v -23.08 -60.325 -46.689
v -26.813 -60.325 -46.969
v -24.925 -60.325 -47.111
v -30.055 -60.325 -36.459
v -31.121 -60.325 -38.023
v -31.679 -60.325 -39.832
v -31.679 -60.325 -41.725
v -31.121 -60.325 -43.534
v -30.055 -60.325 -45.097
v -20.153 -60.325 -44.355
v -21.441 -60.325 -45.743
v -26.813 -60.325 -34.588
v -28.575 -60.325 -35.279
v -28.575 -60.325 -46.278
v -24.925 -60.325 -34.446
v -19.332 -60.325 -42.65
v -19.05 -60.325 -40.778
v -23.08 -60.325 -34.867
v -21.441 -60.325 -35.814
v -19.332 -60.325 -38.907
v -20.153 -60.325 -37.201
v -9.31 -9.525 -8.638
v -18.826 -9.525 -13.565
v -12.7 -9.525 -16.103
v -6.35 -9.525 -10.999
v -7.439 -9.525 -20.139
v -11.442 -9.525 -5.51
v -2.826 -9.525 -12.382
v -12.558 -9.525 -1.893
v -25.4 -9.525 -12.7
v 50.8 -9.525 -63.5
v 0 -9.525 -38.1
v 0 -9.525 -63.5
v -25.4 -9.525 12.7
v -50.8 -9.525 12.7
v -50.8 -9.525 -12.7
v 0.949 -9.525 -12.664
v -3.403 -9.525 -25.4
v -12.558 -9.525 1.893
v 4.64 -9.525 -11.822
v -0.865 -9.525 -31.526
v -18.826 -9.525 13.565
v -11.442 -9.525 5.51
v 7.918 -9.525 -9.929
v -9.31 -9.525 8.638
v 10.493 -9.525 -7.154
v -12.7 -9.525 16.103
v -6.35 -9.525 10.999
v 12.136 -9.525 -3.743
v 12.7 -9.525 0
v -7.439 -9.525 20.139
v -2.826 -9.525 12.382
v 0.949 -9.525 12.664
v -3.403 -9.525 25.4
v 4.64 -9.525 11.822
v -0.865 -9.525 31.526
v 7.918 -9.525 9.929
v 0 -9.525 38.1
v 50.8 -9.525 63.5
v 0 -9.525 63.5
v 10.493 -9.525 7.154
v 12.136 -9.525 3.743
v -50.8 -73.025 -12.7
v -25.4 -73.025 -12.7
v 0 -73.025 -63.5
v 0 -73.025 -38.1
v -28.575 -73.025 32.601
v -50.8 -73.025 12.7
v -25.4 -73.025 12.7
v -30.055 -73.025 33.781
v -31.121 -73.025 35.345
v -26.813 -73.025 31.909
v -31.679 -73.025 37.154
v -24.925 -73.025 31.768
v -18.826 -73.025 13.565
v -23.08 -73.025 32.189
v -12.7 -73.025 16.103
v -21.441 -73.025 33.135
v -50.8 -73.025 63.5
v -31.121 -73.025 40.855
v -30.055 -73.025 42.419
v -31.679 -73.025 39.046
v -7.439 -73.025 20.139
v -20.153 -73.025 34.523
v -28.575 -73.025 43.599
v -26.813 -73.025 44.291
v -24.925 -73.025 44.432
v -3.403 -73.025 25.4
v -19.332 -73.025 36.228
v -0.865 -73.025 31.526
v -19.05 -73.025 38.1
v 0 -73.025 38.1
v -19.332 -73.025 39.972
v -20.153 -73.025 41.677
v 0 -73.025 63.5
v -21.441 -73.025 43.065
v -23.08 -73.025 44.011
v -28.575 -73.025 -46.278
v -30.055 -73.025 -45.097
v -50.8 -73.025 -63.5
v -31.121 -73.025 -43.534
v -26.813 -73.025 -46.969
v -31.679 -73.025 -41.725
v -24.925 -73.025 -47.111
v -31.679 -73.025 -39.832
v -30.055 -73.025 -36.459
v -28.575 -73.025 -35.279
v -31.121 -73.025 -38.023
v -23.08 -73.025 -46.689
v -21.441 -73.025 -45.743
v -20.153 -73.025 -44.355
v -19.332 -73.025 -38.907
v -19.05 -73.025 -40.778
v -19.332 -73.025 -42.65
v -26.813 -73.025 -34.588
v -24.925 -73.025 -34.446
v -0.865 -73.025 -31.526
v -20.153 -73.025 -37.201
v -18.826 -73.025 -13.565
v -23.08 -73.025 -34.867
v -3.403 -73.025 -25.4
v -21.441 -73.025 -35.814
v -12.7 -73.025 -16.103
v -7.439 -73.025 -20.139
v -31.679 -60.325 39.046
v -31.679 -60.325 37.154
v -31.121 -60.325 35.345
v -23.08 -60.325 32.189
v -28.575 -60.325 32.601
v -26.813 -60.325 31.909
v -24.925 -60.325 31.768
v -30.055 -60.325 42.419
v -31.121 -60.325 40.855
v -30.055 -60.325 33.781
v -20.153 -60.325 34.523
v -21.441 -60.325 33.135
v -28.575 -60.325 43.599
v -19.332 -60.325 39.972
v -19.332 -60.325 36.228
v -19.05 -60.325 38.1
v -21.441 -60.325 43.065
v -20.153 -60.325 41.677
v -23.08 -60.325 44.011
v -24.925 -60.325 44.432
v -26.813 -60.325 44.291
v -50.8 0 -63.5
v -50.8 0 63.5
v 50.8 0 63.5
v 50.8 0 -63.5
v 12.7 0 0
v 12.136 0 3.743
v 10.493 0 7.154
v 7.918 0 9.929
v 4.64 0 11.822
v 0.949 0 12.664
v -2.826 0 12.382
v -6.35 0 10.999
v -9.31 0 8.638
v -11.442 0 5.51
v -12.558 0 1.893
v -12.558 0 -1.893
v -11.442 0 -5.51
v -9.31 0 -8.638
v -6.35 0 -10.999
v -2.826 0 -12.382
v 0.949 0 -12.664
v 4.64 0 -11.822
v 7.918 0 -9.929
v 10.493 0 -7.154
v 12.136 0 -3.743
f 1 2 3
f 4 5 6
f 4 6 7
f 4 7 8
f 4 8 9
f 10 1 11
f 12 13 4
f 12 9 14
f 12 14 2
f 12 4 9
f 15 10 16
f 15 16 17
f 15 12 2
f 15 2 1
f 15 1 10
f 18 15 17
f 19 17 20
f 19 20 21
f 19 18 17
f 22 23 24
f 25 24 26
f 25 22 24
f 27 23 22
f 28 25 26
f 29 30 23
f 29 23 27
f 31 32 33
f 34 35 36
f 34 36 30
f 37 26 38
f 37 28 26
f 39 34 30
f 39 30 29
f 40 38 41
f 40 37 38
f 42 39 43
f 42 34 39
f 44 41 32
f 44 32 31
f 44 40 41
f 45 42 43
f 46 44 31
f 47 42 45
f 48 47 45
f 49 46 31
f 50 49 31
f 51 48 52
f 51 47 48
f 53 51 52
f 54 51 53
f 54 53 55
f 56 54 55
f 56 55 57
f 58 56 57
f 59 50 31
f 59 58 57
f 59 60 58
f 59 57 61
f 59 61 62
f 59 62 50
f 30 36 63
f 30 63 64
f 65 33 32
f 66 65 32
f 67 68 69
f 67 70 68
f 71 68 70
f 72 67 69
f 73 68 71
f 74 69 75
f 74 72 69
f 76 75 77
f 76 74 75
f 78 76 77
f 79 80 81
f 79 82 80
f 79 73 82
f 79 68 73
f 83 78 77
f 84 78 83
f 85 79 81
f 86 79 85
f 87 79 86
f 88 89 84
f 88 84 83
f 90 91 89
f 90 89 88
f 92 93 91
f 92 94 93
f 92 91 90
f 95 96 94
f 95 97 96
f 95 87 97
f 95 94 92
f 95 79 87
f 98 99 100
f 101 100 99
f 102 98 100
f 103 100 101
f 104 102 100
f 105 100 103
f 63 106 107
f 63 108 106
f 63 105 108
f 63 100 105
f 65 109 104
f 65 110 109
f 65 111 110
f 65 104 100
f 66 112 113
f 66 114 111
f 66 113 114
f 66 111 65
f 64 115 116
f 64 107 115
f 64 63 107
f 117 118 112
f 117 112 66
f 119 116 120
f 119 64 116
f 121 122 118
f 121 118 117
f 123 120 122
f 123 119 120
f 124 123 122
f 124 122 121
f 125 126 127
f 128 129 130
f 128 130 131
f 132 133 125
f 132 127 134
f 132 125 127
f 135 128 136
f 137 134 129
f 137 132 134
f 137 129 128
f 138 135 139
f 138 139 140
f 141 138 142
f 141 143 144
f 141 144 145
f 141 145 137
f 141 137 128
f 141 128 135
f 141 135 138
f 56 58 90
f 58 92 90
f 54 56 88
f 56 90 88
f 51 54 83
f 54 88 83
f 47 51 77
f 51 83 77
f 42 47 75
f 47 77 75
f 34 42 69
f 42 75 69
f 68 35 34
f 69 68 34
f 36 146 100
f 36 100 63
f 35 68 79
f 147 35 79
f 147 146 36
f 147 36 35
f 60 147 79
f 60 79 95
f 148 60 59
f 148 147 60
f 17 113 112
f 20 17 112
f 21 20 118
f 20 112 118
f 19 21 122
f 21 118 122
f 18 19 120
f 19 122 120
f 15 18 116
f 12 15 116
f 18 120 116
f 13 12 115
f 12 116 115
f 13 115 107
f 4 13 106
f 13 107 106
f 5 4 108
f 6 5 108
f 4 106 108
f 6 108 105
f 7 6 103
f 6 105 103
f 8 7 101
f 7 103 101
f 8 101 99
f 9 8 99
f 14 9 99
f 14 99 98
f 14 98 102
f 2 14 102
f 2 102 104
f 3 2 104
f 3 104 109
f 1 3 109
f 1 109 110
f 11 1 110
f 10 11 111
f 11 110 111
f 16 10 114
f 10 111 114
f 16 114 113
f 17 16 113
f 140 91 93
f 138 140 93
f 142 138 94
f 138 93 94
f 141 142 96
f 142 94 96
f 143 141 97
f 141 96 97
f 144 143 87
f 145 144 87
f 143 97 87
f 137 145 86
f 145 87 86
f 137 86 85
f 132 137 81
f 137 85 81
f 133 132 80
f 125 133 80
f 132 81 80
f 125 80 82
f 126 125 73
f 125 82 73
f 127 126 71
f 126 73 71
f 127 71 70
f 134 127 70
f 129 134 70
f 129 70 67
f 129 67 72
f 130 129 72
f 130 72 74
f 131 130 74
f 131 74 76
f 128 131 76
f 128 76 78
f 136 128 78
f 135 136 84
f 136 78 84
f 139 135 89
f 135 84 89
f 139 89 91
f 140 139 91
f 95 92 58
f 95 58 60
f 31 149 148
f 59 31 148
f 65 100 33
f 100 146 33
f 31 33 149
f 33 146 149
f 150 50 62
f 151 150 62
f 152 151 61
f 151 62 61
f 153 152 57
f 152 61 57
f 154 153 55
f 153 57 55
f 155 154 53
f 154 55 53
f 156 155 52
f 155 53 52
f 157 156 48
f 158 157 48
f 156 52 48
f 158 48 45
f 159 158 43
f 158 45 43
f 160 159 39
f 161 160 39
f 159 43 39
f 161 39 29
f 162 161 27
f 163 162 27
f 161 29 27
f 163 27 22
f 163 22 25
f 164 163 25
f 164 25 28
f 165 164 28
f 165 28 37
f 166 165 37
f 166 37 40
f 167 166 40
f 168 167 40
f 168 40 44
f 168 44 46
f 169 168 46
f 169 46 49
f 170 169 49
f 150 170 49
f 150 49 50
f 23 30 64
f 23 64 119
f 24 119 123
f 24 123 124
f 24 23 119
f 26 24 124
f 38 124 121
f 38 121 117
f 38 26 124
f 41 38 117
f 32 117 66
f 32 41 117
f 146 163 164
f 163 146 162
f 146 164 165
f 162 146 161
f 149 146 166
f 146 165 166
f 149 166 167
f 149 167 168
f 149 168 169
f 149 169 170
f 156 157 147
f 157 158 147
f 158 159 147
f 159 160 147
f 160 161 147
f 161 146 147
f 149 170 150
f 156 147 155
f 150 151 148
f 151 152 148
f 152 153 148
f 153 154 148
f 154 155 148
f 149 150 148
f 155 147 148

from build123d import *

# Parameters (mm, degrees)
F0_W        = 101.6
F0_H        = 127
F1_DEPTH    = 9.525
F2_R        = 12.7
F3_DEPTH    = 63.5
F4_W        = 50.8
F4_H        = 50.8
F5_DEPTH    = 63.5
F6_W        = 50.8
F6_H        = 50.8
F7_DEPTH    = 63.5
F8_T1_DEPTH = 127
F9_R        = 25.4
F10_R       = 6.35
F11_DEPTH   = 12.7
F12_R       = 6.35
F13_DEPTH   = 12.7


# Not quite as in the source:
# - a fillet or chamfer that OpenCascade refuses, or shapes differently, is made with other operations: its cross-section is extruded or revolved along the edge and cut away or added


with BuildPart() as f1:
    # F0 (on Front) → F1 (new body)
    with BuildSketch(Plane.XZ):
        Rectangle(F0_W, F0_H)
    extrude(amount=F1_DEPTH)

    # F2 (on face) → F3 (cut)
    with BuildSketch(Plane.XZ.offset(9.525)):
        Circle(F2_R)
    extrude(amount=-F3_DEPTH, mode=Mode.SUBTRACT)

    # F4 (on face) → F5 (join)
    with BuildSketch(Plane.XZ.offset(9.525)):
        with Locations((-25.4, -38.1)):
            Rectangle(F4_W, F4_H)
    extrude(amount=F5_DEPTH)

    # F6 (on face) → F7 (join)
    with BuildSketch(Plane.XZ.offset(9.525)):
        with Locations((-25.4, 38.1)):
            Rectangle(F6_W, F6_H)
    extrude(amount=F7_DEPTH)

    # F8: fillet of radius 25.4 on 1 edges, made by hand

    # F8_s2 → F8_t1 (cut)
    with BuildSketch(Plane.XZ.offset(9.525)):
        with BuildLine():
            ThreePointArc((-25.4, -12.7), (-7.4394877579, -20.1394877579), (0, -38.1))
            Line((0, -38.1), (0, -12.7))
            Line((0, -12.7), (-25.4, -12.7))
        make_face()
    extrude(amount=F8_T1_DEPTH, mode=Mode.SUBTRACT)

    # F9
    f9_edges = [f1.edges().sort_by_distance(p)[0] for p in [
        (0, -41.275, 12.7),
    ]]
    fillet(f9_edges, radius=F9_R)

    # F10 (on face) → F11 (cut)
    with BuildSketch(Plane.XZ.offset(73.025)):
        with Locations((-25.4, -40.7783836126)):
            Circle(F10_R)
    extrude(amount=-F11_DEPTH, mode=Mode.SUBTRACT)

    # F12 (on face) → F13 (cut)
    with BuildSketch(Plane.XZ.offset(73.025)):
        with Locations((-25.4, 38.1)):
            Circle(F12_R)
    extrude(amount=-F13_DEPTH, mode=Mode.SUBTRACT)


solid = f1.part
